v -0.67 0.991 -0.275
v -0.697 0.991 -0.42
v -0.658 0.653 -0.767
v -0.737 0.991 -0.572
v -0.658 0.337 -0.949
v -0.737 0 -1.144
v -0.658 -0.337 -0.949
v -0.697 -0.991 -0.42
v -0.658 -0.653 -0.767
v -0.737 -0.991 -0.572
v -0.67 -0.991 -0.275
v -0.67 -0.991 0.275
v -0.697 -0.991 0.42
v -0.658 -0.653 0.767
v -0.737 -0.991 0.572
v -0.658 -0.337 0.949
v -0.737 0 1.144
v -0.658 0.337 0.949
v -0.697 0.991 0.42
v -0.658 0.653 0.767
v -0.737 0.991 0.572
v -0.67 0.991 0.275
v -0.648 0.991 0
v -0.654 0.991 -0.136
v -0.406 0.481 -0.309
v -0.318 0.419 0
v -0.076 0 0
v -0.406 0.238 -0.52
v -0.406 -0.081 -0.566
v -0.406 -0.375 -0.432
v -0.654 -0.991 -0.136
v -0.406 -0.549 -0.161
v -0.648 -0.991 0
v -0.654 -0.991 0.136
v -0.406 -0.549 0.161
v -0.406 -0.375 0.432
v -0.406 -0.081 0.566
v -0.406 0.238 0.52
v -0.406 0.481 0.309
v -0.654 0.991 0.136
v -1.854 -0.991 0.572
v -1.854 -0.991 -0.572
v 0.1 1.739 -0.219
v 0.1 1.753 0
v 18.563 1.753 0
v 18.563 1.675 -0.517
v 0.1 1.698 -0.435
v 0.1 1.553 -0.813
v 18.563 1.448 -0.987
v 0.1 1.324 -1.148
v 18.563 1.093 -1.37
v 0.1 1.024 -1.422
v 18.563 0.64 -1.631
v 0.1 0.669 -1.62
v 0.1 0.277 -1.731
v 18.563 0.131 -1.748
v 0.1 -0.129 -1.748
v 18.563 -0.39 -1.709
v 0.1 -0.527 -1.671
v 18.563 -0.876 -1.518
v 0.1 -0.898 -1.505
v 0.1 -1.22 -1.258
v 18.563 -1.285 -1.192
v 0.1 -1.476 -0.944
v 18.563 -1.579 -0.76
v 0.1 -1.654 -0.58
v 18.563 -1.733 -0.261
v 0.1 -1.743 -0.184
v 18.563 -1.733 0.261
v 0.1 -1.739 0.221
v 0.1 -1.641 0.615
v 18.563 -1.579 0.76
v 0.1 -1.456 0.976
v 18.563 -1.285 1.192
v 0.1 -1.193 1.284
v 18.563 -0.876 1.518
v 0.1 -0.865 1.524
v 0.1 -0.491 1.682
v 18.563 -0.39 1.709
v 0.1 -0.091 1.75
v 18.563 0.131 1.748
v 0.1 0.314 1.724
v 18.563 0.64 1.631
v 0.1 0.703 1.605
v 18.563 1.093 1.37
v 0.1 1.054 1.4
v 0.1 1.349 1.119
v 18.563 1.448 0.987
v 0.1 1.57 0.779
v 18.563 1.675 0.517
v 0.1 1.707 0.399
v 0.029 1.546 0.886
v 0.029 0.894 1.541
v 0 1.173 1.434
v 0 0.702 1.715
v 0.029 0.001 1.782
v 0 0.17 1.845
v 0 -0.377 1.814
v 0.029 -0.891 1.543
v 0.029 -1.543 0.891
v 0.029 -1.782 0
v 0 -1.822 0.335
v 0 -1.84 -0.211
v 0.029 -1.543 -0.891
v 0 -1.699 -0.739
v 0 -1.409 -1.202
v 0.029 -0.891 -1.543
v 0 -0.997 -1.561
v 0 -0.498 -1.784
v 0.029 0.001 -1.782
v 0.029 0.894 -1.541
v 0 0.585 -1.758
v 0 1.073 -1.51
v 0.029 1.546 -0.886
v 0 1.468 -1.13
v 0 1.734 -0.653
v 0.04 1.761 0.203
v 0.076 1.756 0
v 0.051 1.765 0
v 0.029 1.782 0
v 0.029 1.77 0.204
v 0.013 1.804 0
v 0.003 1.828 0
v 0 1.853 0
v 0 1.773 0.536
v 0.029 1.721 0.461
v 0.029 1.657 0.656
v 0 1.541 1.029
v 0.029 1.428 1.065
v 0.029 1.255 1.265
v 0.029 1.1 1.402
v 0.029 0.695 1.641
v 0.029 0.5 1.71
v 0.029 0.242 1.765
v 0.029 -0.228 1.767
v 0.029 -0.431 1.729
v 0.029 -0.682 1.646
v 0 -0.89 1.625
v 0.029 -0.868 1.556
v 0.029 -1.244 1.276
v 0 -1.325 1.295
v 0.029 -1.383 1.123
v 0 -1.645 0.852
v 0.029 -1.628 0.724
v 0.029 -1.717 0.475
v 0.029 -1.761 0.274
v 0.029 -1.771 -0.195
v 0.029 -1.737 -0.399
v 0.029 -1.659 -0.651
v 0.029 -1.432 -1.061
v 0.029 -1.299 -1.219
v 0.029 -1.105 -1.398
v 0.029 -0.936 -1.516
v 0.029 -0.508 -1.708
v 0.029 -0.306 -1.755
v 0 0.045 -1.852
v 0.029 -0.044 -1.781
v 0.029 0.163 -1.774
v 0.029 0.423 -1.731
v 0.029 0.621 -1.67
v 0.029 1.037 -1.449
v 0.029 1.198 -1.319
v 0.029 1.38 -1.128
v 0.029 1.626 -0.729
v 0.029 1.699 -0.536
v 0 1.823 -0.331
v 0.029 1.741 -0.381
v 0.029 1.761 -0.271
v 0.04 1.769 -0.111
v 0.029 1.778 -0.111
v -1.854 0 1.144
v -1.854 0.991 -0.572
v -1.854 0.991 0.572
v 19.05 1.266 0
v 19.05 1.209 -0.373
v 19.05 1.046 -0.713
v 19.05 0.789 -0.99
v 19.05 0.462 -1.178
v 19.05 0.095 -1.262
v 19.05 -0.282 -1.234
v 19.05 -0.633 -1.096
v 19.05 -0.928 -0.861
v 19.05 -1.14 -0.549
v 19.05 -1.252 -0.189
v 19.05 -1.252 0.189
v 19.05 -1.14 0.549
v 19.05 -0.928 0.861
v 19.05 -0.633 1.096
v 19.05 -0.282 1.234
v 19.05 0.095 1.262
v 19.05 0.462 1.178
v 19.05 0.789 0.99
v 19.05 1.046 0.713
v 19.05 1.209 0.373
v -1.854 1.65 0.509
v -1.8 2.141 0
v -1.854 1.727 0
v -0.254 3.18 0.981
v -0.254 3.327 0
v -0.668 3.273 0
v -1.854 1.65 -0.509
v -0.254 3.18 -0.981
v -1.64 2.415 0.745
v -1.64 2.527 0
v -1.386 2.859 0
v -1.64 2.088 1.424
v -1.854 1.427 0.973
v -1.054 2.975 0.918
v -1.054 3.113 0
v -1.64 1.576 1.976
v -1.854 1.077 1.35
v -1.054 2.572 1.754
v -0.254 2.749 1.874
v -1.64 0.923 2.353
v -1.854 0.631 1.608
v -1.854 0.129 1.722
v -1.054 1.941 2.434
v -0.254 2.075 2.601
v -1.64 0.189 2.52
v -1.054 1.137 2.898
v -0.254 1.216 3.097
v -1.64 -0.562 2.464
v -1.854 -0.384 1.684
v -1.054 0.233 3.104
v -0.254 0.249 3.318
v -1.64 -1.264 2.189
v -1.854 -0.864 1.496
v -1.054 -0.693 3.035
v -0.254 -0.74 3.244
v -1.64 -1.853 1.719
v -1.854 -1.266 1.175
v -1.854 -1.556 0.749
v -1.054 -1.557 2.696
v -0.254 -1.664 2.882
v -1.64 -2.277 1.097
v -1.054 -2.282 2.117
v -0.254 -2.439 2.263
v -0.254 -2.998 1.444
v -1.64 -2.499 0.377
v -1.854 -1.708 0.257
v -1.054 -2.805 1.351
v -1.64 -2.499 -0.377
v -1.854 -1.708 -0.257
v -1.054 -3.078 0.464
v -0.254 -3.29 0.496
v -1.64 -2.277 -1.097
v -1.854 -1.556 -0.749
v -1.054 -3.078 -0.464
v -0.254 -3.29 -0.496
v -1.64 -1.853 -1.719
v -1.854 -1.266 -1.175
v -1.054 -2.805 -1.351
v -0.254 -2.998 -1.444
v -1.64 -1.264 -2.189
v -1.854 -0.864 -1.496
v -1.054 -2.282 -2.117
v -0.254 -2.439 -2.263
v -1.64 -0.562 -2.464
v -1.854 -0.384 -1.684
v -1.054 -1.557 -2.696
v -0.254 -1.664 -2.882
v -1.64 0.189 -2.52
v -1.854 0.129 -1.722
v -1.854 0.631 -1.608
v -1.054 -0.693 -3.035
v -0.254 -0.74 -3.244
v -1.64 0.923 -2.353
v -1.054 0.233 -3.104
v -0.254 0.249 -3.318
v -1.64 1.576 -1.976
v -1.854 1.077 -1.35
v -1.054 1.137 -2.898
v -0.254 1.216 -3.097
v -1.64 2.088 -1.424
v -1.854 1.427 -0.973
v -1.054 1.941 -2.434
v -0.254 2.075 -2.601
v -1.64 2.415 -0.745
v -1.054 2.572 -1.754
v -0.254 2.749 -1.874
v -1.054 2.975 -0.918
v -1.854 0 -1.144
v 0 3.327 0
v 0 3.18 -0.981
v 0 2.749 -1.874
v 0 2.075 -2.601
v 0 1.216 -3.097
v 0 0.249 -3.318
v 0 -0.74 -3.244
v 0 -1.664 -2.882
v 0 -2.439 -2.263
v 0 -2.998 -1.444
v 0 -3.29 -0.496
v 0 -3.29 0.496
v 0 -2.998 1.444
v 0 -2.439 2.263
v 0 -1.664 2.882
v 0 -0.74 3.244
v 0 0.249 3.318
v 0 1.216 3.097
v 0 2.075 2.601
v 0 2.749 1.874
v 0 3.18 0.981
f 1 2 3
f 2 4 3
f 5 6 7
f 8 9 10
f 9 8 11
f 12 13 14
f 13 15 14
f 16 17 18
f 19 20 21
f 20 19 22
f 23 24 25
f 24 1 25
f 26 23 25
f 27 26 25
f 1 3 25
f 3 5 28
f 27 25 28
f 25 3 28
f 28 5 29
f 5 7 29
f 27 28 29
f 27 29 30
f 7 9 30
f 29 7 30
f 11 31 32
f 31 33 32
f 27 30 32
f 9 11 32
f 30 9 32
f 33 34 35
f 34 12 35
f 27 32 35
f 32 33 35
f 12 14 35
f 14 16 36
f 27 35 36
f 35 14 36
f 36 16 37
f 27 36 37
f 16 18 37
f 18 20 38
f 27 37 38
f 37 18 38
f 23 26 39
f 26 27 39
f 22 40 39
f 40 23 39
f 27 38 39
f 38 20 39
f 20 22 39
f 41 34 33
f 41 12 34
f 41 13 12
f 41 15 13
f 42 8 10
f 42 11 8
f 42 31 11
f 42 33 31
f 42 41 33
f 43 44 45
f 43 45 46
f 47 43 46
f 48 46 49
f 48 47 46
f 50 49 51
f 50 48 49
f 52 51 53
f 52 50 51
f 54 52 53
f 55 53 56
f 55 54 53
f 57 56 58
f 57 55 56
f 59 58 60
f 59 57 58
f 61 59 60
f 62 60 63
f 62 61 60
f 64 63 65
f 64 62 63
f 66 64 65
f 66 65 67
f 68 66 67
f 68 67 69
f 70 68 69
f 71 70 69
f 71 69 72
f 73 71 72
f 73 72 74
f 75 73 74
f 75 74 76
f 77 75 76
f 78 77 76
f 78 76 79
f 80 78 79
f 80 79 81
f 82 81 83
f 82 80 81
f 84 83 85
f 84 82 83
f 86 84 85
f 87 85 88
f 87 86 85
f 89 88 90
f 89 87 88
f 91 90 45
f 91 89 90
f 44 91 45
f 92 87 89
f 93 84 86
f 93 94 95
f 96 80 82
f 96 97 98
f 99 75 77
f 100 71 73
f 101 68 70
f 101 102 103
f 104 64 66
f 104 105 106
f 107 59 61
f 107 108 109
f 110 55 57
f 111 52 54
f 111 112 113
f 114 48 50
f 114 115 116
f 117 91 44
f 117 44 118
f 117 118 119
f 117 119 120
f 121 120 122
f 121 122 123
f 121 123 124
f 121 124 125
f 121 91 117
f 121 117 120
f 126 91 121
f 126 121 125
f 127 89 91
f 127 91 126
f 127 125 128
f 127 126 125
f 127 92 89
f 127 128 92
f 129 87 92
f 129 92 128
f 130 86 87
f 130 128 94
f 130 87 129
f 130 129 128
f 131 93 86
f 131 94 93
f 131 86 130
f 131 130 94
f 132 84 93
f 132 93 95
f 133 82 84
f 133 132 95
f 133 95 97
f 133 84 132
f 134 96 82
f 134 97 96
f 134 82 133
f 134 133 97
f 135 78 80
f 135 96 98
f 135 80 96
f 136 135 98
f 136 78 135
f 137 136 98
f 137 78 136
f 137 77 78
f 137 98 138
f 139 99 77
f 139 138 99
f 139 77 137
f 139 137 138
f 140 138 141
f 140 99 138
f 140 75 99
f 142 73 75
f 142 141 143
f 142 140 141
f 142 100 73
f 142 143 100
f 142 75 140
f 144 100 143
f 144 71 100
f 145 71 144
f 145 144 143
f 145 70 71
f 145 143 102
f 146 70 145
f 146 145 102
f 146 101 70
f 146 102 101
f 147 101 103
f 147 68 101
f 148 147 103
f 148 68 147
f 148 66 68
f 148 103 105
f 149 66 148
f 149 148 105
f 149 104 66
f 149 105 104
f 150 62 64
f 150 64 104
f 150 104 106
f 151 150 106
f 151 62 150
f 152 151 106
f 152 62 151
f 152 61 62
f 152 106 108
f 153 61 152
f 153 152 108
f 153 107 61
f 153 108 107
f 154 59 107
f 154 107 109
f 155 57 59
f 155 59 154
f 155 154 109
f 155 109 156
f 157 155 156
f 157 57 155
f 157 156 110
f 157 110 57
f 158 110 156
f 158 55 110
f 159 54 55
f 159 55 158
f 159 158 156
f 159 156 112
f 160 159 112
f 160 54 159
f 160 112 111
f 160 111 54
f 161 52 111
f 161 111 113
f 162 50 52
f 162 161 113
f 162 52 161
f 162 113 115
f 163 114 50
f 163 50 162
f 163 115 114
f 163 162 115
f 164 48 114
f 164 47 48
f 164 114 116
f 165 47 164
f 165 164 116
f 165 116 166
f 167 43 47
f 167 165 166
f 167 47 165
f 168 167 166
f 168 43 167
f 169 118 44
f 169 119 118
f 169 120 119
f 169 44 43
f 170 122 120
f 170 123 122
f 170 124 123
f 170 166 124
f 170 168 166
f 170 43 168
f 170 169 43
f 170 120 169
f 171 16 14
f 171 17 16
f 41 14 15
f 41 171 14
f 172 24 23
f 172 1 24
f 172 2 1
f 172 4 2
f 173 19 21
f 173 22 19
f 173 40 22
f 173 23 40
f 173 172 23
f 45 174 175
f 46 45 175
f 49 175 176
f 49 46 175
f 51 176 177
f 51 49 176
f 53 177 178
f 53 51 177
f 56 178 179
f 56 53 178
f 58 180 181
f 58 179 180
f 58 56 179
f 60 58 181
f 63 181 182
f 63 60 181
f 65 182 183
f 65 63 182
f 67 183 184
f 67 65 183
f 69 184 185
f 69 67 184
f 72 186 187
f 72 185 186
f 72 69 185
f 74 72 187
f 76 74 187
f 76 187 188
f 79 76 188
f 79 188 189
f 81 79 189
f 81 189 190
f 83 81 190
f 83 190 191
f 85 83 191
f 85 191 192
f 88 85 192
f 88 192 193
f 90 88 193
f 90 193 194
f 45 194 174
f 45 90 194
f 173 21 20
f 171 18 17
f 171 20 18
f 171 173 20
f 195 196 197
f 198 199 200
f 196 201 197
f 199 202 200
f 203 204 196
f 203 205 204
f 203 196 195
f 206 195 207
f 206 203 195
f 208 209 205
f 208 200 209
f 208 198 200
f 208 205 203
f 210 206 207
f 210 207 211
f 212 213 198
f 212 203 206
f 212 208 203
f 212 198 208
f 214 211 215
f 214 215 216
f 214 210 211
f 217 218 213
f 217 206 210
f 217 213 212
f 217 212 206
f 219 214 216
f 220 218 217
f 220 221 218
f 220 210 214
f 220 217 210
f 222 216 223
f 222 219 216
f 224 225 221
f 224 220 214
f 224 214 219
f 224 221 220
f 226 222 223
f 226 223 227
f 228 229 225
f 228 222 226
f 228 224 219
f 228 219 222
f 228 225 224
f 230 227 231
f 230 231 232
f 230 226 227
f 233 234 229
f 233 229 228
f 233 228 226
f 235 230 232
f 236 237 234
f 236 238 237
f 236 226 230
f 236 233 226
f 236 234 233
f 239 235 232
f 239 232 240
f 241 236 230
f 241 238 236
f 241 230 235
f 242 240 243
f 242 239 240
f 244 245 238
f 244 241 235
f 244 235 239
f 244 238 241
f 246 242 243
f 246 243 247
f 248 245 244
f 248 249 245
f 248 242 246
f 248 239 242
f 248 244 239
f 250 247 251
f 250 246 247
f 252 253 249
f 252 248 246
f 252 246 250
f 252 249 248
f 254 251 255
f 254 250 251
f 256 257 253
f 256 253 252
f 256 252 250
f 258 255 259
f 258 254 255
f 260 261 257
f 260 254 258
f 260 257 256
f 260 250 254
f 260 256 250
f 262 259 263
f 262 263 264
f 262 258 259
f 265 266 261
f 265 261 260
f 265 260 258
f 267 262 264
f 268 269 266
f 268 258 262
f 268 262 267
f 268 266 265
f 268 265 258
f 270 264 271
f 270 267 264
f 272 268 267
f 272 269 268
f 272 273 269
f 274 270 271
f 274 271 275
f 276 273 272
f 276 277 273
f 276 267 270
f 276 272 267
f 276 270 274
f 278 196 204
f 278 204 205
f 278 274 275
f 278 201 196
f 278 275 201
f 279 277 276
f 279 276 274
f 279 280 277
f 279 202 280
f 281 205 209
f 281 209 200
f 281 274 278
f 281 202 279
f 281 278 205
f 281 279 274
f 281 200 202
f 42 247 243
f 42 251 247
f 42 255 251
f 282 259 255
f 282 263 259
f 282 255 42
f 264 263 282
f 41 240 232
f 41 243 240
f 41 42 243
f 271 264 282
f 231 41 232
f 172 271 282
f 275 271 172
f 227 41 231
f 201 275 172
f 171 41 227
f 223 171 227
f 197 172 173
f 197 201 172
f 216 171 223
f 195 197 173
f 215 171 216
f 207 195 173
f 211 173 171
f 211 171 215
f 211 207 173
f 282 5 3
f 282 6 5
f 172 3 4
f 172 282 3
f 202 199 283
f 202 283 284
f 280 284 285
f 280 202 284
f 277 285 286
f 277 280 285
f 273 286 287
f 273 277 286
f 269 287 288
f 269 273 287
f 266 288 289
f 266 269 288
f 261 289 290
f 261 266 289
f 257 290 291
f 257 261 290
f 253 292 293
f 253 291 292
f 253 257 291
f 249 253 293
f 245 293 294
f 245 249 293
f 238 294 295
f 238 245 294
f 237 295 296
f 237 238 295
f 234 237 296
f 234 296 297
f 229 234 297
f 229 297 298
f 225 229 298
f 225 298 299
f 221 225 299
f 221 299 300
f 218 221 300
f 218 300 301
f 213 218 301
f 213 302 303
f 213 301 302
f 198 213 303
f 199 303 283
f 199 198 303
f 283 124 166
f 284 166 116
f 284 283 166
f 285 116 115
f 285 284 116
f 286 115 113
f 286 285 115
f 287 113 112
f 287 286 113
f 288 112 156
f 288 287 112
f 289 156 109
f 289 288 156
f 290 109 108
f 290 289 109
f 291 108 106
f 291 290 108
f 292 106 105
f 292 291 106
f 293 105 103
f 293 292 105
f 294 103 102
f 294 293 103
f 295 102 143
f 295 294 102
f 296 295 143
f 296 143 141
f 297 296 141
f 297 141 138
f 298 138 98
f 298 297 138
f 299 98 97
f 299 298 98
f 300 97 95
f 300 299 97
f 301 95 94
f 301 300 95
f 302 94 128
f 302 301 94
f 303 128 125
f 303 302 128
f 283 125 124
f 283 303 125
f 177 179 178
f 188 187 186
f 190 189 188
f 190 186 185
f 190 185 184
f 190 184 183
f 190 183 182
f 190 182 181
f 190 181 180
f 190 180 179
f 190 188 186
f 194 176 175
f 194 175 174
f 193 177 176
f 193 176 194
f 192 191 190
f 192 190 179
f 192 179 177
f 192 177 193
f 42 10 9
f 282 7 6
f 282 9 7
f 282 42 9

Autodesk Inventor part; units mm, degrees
ref_plane "YZ Plane" through (0, 0, 0) normal (1, 0, 0) x (0, 1, 0)
ref_plane "XZ Plane" through (0, 0, 0) normal (0, 1, 0) x (-1, 0, 0)
sketch "Sketch1" plane through (0, 0, 0) normal (0, 0, 1) x (1, 0, 0)
  line L0 (-0.0762, 0) -> (19.05, 0)
  line L1 (19.05, 0) -> (19.05, 1.7526)
  line L2 (19.05, 1.7526) -> (1.5902, 1.7526)
  line L3 (1.5902, 1.7526) -> (0.0001, 1.7526)
  line L4 (0.0001, 1.7526) -> (0, 1.7526)
  line L5 (0, 1.7526) -> (0, 3.3274)
  line L6 (0, 3.3274) -> (-1.8542, 3.3274)
  line L7 (-1.8542, 3.3274) -> (-1.8542, 1.1438)
  line L8 (-1.8542, 1.1438) -> (-0.7366, 1.1438)
  line L9 (-0.7366, 1.1438) -> (-0.0762, 0)
  line L10 (-6.035, 0) -> (23.2308, 0) projected
  line L11 (0, -0.6655) -> (0, 3.9929) projected
  line L12 (1.5902, 1.7526) -> (0, 1.7526) construction
  dimension "d1" = 17.4598
  dimension "d2" = 1.5901
  dimension "d3" = 1.8542
  dimension "d4" = 1.1176
  dimension "d5" = 60
  dimension "d6" = 3.5052
  dimension "d7" = 3.5052
  dimension "d8" = 2.2877
  dimension "d9" = 6.6548
  dimension "d26" = 19.05
revolve "Body" add sketch "Sketch1" angle 360 about axis through (-0.0762, 0, 0) along (1, 0, 0)
sketch "Sketch2" plane through (-1.8542, 0, 0) normal (-1, 0, 0) x (0, 0, 1)
  circle A0 centre (0, 0) radius 1.1438 projected
  line L0 (0, -4.6584) -> (0, 4.6584) projected
  line L1 (-4.6584, 0) -> (4.6584, 0) projected
  line L2 (1.1438, 0) -> (0.5719, -0.9906)
  line L3 (0.5719, -0.9906) -> (-0.5719, -0.9906)
  line L4 (-0.5719, -0.9906) -> (-1.1438, 0)
  line L5 (-1.1438, 0) -> (-0.5719, 0.9906)
  line L6 (-0.5719, 0.9906) -> (0.5719, 0.9906)
  line L7 (0.5719, 0.9906) -> (1.1438, 0)
extrude "Slot" add sketch "Sketch2" against normal up to next contours L7 A0 | A0 L2 | L6 L0 A0 | A0 L0 L3 | L0 L6 A0 | A0 L3 L0 | L4 A0 | A0 L5
fillet "Fillet1" radius 1.6002 1 edges at (-1.8542, -3.3274, 0)
thread "Thread" size "6-32 UNC" class "2A" standard "ANSI Unified Screw Threads" length 17.4598
chamfer "Chamfer1" distance 0.4869 distance2 0.4869 1 edges at (19.05, -1.7526, 0) measured on face at (19.05, 0.4373, -0.3874)
ref_plane "Work Plane1" through (29, 0, 0) normal (0, -1, 0) x (1, 0, 0)
fillet "Fillet2" radius 0.1 1 edges at (0.0001, -1.7526, 0)
equation "\"d1\" = GEL"
equation "\"d3\" = KOH"
equation "\"d4\" = INTI"
equation "\"d6\" = GD"
equation "\"d7\" = BDM"
equation "\"d8\" = 1.1547 * SW"
equation "\"d9\" = KOD"
equation "\"d26\" = NLG"
equation "\"d30\" = R"
equation "\"d17\" = RR"
equation "\"d13\" = GEL"
equation "\"d15\" = -0.5 * SPD + 0.5 * GD"
equation "\"d16\" = GUL"
equation "\"GD\" = NND"
equation "\"NLG\" = 19.05"
equation "\"GEL\" = 17.45976"
equation "\"KOD\" = 6.6548"
equation "\"KOH\" = 1.8542"
equation "\"INTI\" = 1.1176"
equation "\"GAL\" = 1.59004"
equation "\"GUL\" = 0.48692"
equation "\"BDM\" = NND"
equation "\"SW\" = 1.9812"
equation "\"RR\" = 1.6002"
equation "\"SPD\" = 2.53136"
equation "\"R\" = 0.1"
equation "\"TOA\" = 30deg"
equation "\"GD1\" = SPD"
equation "\"THREADDIA\" = 3.5052"
equation "\"KOH1\" = 0.381"
equation "\"NND\" = 3.5052"
equation "\"E0\" = 2.28829"
properties part number "ANSI B18.3 - 6 - 32 x 3/4" material "Steel, Mild"
